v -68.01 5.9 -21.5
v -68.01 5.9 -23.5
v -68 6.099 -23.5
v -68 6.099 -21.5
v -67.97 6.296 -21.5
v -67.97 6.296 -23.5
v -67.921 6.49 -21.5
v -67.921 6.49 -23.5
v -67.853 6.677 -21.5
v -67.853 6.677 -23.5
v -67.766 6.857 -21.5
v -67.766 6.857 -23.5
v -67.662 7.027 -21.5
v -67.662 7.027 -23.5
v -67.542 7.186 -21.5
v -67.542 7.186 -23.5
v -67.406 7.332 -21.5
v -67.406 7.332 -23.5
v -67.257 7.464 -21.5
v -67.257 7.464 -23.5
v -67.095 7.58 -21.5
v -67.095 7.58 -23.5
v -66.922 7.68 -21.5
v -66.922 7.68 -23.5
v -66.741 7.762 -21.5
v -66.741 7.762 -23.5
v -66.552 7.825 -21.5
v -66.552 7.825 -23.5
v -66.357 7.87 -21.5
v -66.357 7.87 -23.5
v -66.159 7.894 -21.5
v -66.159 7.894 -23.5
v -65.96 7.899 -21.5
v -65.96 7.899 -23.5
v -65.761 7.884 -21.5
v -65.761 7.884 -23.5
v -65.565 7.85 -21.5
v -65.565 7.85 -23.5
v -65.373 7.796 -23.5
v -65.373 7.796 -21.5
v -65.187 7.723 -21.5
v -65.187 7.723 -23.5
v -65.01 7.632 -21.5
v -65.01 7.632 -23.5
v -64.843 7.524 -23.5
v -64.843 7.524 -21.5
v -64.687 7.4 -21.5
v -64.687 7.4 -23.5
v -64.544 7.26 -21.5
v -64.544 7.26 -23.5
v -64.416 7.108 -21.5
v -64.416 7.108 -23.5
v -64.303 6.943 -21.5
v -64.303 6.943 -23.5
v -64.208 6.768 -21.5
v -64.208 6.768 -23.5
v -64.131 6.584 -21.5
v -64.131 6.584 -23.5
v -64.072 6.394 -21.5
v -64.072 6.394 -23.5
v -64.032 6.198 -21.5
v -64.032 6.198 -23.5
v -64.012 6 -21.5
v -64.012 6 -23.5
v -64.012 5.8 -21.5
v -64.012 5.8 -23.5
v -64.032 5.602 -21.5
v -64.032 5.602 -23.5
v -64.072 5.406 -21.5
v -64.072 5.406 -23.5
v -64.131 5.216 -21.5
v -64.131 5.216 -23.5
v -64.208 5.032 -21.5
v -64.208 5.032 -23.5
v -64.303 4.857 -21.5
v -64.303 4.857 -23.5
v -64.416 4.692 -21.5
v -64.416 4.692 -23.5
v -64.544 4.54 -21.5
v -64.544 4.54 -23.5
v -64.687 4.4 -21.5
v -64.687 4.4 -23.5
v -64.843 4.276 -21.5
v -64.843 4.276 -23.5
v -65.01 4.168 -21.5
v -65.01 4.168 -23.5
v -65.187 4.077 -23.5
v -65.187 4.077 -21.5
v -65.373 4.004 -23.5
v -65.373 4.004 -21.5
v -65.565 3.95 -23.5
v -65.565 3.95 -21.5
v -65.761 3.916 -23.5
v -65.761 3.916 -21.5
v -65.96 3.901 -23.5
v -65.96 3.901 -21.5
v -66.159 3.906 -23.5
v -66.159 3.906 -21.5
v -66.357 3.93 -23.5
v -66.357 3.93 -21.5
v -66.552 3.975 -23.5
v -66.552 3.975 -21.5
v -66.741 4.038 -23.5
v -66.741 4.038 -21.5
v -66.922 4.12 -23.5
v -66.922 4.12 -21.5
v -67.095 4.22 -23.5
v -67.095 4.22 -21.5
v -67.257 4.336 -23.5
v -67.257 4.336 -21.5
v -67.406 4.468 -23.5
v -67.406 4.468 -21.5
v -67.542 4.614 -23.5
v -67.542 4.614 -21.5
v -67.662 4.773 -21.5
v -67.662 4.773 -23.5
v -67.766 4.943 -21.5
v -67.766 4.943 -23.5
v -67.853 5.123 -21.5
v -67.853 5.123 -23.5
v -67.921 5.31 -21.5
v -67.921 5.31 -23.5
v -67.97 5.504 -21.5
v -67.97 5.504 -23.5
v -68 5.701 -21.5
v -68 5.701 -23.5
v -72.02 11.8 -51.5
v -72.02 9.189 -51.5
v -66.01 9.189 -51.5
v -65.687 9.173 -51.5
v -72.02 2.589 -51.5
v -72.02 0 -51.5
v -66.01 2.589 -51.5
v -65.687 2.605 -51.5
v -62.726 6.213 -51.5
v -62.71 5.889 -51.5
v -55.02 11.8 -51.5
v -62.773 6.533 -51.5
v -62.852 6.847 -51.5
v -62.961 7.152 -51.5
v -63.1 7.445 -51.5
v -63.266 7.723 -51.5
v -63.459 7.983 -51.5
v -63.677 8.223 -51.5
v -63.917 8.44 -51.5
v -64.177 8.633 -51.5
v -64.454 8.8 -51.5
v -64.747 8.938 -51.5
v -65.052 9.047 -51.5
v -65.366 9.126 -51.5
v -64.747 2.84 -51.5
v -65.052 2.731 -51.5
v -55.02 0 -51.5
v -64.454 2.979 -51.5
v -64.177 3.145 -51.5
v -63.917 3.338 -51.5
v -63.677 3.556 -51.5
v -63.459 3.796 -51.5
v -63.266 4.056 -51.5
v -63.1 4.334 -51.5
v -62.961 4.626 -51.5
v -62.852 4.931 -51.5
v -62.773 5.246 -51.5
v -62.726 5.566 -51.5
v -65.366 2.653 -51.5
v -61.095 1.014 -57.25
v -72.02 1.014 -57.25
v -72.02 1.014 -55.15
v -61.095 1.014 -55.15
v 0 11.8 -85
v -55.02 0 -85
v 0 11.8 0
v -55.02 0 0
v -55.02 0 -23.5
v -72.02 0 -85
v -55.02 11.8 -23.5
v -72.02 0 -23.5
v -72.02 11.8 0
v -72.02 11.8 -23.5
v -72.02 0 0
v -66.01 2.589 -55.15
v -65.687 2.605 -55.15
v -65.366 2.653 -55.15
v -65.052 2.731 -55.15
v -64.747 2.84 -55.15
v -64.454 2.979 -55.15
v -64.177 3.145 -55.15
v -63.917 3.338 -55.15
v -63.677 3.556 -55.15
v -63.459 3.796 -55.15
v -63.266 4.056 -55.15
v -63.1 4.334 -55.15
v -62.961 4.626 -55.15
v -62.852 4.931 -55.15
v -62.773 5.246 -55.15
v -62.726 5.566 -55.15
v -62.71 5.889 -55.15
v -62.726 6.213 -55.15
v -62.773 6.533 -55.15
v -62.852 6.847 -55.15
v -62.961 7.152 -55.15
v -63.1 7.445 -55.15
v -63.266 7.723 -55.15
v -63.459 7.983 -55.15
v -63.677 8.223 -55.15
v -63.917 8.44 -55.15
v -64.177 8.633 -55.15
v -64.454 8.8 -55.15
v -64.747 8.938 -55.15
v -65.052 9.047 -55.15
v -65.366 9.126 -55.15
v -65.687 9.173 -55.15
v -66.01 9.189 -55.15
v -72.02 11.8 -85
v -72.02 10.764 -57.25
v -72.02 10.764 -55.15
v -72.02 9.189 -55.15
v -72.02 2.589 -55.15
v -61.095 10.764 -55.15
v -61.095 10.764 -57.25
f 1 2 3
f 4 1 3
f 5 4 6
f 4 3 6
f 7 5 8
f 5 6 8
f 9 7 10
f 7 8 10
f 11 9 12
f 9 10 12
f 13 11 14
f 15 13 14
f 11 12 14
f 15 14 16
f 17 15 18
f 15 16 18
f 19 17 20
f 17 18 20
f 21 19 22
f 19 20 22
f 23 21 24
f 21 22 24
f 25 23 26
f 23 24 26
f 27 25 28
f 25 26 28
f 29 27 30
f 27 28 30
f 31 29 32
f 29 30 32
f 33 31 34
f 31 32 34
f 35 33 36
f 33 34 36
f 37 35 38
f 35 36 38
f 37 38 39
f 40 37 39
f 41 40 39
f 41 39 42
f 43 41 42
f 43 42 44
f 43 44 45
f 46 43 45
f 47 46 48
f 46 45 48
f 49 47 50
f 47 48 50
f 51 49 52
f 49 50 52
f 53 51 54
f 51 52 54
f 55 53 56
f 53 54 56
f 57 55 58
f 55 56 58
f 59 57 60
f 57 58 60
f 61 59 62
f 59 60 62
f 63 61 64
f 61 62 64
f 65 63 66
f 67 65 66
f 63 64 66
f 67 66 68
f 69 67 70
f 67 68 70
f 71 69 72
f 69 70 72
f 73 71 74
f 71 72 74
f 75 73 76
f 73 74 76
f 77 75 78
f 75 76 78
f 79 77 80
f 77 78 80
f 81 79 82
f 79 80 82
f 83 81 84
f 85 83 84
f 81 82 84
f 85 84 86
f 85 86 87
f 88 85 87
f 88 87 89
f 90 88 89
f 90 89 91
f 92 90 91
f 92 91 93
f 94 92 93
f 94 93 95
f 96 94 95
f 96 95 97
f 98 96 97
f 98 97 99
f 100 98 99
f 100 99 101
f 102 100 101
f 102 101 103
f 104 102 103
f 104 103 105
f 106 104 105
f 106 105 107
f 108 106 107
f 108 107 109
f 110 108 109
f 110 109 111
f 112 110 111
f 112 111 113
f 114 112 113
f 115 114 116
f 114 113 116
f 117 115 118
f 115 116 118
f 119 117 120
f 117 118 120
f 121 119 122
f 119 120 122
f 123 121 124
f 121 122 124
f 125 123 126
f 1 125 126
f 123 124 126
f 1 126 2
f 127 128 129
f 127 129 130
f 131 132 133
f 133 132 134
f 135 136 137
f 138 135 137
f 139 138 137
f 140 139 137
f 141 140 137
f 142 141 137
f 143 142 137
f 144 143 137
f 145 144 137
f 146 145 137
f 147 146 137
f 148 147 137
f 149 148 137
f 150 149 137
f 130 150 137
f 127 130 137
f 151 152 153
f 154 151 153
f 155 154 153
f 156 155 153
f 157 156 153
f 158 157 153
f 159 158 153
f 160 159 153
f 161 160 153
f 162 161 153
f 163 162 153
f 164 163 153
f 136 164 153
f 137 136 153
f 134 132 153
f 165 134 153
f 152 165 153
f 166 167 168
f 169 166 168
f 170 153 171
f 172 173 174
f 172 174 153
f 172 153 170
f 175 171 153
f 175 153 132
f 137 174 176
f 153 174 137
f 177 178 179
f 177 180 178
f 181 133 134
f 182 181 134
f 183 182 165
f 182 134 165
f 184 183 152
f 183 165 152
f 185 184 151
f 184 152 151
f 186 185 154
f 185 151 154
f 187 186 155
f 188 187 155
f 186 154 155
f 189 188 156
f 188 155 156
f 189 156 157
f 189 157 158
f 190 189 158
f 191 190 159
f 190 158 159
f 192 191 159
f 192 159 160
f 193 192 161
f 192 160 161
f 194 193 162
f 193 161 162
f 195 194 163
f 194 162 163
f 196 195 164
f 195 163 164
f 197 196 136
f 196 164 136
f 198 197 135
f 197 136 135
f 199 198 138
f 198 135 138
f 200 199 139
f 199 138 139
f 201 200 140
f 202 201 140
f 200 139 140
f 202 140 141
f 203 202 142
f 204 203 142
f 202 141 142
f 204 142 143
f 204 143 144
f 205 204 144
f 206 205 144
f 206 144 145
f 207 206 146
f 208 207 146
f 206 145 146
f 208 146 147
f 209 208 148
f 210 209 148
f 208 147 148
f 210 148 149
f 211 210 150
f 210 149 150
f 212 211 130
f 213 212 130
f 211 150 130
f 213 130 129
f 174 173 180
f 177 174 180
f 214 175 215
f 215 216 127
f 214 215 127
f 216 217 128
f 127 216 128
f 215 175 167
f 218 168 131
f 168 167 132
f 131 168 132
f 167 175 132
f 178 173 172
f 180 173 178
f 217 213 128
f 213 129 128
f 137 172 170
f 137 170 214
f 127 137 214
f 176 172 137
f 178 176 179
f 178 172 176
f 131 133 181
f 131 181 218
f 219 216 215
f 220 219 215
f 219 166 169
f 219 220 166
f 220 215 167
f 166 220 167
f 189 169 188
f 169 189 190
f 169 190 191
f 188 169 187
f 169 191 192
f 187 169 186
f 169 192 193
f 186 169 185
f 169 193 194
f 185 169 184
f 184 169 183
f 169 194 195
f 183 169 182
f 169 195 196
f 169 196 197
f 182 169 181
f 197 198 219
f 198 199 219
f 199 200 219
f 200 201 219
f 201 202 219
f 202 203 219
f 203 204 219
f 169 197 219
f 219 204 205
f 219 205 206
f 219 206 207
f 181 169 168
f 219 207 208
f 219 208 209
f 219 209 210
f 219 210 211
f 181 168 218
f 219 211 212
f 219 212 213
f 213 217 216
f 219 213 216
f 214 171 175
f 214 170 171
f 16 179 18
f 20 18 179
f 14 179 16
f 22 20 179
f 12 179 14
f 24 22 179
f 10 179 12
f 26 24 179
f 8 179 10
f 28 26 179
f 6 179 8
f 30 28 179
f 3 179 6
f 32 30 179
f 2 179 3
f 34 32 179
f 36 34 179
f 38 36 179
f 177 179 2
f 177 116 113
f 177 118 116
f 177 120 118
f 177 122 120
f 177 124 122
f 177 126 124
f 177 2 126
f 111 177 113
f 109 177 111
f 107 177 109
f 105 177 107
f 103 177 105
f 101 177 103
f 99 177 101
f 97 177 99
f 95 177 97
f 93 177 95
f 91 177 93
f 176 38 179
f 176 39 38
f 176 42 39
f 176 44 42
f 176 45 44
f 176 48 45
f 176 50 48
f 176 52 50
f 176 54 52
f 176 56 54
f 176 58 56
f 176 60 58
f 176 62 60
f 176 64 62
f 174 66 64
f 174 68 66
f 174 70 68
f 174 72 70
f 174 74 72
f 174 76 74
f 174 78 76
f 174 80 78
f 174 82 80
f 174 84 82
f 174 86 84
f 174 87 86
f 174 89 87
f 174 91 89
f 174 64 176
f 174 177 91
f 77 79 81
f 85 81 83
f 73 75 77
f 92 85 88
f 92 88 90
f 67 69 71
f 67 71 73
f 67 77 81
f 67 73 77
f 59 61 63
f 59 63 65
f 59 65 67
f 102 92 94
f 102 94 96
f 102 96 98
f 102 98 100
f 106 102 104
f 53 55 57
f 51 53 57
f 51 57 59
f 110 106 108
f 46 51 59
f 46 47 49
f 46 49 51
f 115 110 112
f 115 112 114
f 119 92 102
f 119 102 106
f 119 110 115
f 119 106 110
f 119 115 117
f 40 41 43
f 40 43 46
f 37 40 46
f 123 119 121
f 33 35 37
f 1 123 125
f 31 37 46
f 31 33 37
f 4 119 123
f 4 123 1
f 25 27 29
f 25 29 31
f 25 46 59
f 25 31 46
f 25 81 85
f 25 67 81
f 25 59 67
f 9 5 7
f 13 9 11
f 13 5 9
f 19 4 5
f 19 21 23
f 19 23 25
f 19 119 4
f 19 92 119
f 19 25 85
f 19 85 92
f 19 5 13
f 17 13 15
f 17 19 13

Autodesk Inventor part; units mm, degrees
ref_plane "YZ Plane" through (0, 0, 0) normal (1, 0, 0) x (0, 1, 0)
ref_plane "XZ Plane" through (0, 0, 0) normal (0, 1, 0) x (-1, 0, 0)
ref_plane "XY Plane" through (0, 0, 0) normal (0, 0, 1) x (1, 0, 0)
sketch "Sketch1" plane through (0, 0, 0) normal (0, 1, 0) x (-1, 0, 0)
  line L0 (0, 0) -> (60, 0)
  line L1 (55.02, -23.5) -> (55.02, -51.5)
  line L2 (60, -75) -> (0, -75)
  line L3 (0, -75) -> (0, 0)
  line L4 (55.02, -23.5) -> (72.02, -23.5) construction
  line L5 (72.02, -23.5) -> (72.02, -51.5) construction
  line L6 (72.02, -51.5) -> (55.02, -51.5) construction
  line L7 (55.02, -51.5) -> (55.02, -23.5)
  line L8 (72.02, -51.5) -> (55.02, -51.5)
  line L9 (60, -75) -> (72.02, -75)
  line L10 (72.02, -75) -> (72.02, -51.5)
  line L11 (72.02, -23.5) -> (55.02, -23.5)
  line L12 (60, 0) -> (72.02, 0)
  line L13 (72.02, 0) -> (72.02, -23.5)
  point P0 (55.02, -37.5)
  point P1 (63.52, -51.5)
  point P2 (63.52, -51.5)
  dimension "d2" = 28
  dimension "d25" = 8.5
  dimension "d26" = 60
  dimension "d27" = 12.02
  dimension "d28" = 72.02
  dimension "d36" = 17
  dimension "d37" = 23.5
extrude "Extrusion1" add sketch "Sketch1" along normal blind 11.8
sketch "Sketch2" plane through (-55.02, 0, -23.5) normal (0, 0, -1) x (-1, 0, 0)
  circle A0 centre (10.99, 5.9) radius 2
  line L0 (17, 0) -> (17, 11.8) projected
  point P0 (-55.02, 0)
  dimension "d6" = 4
  dimension "d7" = 6.01
extrude "Extrusion2" cut sketch "Sketch2" against normal blind 2
sketch "Sketch3" plane through (-72.02, 0, -51.5) normal (0, 0, 1) x (1, 0, 0)
  arc A0 (6.01, 2.5893) -> (6.01, 9.1893) centre (6.01, 5.8893) ccw
  line L0 (6.01, 9.1893) -> (0, 9.1893)
  line L1 (0, 0) -> (0, 11.8) projected
  line L2 (6.01, 2.5893) -> (0, 2.5893)
  point P0 (72.02, 0)
  dimension "d10" = 6.6
  dimension "d21" = 6.01
  dimension "d22" = 6.01
extrude "Extrusion3" cut sketch "Sketch3" against normal blind 3.65
sketch "Sketch4" plane through (-72.02, 0, -75) normal (-1, 0, 0) x (0, 0, 1)
  line L0 (19.85, 10.7643) -> (17.75, 10.7643)
  line L1 (17.75, 10.7643) -> (17.75, 1.0143)
  line L2 (17.75, 1.0143) -> (19.85, 1.0143)
  line L3 (19.85, 1.0143) -> (19.85, 10.7643)
  line L4 (19.85, 2.5893) -> (19.85, 9.1893) projected
  point P0 (75, 0)
  point P1 (19.85, 5.8893)
  dimension "d13" = 2.1
  dimension "d14" = 9.75
extrude "Extrusion4" cut sketch "Sketch4" against normal blind 10.925
sketch "Sketch5" plane through (-72.02, 0, 0) normal (0, 0, 1) x (1, 0, 0)
  line L0 (17, 0) -> (17, 11.8) projected
  line L1 (72.02, 11.8) -> (0, 11.8) projected
  line L2 (17, 0) -> (72.02, 11.8)
  line L3 (72.02, 11.8) -> (72.02, 0)
  line L4 (72.02, 0) -> (17, 0)
extrude "Extrusion5" cut sketch "Sketch5" against normal blind 88.5 contours L2 L3 L4
sketch "Sketch6" plane through (-72.02, 0, -75) normal (0, 0, -1) x (-1, 0, 0)
  line L0 (-72.02, 11.8) -> (-17, 0) projected
  line L1 (0, 11.8) -> (-72.02, 11.8) projected
  line L2 (-72.02, 11.8) -> (0, 11.8)
  line L3 (0, 11.8) -> (0, 0)
  line L4 (-17, 0) -> (-17, 11.8) projected
  line L5 (0, 0) -> (-17, 0)
  line L6 (-17, 0) -> (-72.02, 11.8)
  point P0 (-72.02, 0)
extrude "Extrusion6" add sketch "Sketch6" along normal blind 10
properties part number "hand_right_1"
